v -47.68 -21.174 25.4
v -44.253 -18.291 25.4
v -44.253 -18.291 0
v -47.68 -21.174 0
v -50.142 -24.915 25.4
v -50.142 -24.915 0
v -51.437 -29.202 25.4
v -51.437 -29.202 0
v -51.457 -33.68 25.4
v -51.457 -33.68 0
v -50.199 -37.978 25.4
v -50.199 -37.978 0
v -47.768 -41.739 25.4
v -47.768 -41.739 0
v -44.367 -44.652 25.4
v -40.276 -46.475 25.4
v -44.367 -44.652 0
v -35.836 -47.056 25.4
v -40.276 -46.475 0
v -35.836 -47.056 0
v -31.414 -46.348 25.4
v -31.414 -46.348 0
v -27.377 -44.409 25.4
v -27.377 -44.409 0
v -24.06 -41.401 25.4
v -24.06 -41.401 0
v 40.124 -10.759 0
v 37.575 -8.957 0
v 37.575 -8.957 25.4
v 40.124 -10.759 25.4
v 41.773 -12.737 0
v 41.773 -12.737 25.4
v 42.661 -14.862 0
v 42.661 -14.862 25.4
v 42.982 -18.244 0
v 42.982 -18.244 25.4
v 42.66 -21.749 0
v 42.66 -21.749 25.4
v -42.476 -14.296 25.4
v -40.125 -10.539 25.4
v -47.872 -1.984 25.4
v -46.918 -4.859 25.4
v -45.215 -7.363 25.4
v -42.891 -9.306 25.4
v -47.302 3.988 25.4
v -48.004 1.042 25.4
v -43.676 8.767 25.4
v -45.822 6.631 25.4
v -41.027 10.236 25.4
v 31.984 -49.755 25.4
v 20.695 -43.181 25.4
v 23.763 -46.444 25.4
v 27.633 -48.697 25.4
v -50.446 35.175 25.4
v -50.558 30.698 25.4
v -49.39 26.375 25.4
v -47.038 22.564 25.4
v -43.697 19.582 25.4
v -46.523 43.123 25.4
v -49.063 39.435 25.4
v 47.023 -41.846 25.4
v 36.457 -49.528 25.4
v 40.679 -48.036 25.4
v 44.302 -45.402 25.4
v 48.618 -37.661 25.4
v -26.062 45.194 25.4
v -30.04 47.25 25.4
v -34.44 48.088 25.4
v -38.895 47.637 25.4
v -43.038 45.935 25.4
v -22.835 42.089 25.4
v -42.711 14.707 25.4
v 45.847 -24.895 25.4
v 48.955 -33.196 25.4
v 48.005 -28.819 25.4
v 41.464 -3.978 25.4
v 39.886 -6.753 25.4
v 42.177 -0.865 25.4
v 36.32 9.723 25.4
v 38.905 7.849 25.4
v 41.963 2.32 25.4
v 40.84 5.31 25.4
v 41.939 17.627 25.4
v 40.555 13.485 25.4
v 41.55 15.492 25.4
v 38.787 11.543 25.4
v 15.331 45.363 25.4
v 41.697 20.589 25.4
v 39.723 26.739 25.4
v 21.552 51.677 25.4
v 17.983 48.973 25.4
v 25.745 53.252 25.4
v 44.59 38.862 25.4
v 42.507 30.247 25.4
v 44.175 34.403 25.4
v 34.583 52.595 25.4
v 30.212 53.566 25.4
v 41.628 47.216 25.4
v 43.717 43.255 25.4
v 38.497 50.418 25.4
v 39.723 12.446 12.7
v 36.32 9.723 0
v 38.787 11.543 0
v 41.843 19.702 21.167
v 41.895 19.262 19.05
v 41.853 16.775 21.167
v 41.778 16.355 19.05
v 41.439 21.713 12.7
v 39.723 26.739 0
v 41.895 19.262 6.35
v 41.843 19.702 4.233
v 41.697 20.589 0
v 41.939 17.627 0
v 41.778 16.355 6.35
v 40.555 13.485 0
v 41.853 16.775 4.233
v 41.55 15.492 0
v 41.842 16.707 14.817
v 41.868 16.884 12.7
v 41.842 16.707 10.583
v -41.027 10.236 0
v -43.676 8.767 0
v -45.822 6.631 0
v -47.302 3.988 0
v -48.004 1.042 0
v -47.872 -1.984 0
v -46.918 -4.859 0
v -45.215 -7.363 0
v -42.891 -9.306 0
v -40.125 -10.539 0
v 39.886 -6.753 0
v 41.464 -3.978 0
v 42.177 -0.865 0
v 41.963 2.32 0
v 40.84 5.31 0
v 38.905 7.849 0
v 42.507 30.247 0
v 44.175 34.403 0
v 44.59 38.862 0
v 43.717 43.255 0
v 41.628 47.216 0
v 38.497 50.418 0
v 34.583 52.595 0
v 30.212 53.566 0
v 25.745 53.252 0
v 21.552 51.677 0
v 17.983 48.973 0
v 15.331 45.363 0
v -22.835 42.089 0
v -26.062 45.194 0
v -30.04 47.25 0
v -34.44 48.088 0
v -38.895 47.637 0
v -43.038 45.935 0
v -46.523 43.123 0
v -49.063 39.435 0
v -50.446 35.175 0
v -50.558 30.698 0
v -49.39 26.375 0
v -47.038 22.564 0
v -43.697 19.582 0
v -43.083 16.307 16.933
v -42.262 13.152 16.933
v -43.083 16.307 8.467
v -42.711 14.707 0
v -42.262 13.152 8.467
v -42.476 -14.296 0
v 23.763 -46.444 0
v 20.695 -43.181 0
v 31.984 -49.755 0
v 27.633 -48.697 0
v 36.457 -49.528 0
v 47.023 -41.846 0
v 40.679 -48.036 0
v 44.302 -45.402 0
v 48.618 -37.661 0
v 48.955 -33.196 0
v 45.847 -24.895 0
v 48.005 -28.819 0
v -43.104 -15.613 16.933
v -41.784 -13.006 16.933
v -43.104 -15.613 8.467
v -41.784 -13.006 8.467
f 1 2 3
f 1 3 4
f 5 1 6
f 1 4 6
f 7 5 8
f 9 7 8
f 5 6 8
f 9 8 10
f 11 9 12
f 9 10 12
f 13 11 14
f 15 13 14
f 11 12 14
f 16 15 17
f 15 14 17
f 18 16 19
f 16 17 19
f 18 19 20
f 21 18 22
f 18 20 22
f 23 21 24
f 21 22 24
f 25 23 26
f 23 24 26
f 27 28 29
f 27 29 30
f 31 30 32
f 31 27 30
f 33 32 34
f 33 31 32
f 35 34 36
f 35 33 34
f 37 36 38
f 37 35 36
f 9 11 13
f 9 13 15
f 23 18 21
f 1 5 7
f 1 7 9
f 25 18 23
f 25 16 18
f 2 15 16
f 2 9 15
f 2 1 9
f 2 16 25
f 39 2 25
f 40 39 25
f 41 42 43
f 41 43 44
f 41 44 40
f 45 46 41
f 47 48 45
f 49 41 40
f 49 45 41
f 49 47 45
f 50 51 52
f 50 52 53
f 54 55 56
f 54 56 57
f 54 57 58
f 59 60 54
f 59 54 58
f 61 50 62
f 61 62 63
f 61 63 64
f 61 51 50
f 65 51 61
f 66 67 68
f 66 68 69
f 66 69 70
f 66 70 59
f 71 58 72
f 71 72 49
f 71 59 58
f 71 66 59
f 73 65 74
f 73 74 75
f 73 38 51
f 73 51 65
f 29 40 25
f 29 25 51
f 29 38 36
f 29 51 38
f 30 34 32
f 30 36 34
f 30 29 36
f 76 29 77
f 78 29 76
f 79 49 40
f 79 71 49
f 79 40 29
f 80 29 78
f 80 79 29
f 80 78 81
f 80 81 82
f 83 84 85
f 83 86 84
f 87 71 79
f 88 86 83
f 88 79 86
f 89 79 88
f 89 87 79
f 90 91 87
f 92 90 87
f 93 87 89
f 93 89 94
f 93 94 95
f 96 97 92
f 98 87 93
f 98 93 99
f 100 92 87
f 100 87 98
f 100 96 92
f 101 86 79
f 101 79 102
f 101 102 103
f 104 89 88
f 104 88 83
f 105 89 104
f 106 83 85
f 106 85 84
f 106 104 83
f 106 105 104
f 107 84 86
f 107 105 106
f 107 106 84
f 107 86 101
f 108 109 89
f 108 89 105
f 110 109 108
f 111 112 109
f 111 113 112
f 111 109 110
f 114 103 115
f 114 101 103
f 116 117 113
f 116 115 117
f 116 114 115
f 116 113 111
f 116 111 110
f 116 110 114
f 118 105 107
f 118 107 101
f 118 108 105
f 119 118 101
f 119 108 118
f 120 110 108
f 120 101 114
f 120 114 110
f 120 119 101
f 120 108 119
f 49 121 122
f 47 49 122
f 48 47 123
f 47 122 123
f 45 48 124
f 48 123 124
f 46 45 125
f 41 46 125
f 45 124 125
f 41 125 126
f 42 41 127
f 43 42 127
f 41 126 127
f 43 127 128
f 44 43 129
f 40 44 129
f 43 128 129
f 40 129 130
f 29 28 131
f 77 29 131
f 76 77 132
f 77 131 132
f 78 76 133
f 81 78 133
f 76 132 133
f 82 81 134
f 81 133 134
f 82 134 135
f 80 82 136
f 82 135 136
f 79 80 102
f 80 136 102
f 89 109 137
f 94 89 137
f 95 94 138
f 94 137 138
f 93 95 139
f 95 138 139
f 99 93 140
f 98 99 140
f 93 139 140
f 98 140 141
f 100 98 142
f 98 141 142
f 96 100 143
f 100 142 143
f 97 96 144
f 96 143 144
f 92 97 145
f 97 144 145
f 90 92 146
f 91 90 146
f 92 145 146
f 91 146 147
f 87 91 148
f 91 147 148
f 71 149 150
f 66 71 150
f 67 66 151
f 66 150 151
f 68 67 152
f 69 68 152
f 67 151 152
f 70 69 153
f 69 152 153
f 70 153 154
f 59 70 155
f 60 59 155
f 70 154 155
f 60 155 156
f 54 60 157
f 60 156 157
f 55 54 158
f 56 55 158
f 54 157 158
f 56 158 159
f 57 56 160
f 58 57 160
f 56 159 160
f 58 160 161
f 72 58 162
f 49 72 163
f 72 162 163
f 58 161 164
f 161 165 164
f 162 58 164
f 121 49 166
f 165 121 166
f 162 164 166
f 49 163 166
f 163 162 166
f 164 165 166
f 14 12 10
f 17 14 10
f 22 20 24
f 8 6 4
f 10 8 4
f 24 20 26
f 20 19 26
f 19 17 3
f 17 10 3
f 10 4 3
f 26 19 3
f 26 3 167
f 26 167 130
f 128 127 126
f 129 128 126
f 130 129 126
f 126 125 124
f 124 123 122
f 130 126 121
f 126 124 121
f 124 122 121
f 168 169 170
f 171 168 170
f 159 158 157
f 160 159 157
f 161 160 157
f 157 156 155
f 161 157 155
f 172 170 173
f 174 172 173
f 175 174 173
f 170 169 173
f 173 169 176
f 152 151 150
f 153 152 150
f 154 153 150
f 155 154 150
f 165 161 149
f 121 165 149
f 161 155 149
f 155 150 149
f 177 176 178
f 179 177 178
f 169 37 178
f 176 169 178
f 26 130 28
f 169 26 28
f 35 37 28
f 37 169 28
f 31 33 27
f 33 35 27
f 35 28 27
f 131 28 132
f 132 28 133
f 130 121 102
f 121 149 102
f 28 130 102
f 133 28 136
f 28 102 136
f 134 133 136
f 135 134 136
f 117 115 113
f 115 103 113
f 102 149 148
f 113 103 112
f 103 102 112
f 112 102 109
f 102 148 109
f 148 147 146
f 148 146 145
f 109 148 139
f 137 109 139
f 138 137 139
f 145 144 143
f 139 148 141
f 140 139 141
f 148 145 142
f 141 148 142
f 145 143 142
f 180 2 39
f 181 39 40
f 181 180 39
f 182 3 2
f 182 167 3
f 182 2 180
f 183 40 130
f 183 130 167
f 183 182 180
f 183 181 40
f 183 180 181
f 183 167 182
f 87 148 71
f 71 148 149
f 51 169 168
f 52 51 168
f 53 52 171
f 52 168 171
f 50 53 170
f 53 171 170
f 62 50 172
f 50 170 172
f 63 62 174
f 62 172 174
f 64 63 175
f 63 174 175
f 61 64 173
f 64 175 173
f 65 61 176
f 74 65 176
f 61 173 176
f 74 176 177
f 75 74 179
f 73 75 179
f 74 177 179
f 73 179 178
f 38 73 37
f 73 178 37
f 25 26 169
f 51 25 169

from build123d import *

# Parameters (mm, degrees)
F1_DEPTH = 25.4


with BuildPart() as f1:
    # F0 (on Top) → F1 (new body)
    with BuildSketch(Plane.XY):
        with BuildLine():
            Line((15.3314765699, 45.3634702184), (-22.8350594245, 42.0886999699))
            ThreePointArc((-22.8350594245, 42.0886999699), (-46.5230995583, 43.1231755121), (-43.6973915181, 19.5815366758))
            add(Edge.make_bspline(
                [(-43.6973915181, 19.5815366758), (-43.1174367744, 16.2871292149), (-42.5374820306, 12.9927217539), (-41.0270827556, 10.2359403638)],
                knots=[0, 0, 0, 0, 0.3327137819, 0.3327137819, 0.3327137819, 0.3327137819], degree=3))
            add(Edge.make_bspline(
                [(-41.0270827556, 10.2359403638), (-40.5110375862, 9.2940545041), (-36.8442315299, 4.1334897017), (-28.1561256987, 1.87431405), (-20.9480811119, 0)],
                knots=[0.3327137819, 0.3327137819, 0.3327137819, 0.3327137819, 0.4463892469, 1, 1, 1, 1], degree=3))
            add(Edge.make_bspline(
                [(-40.1252666441, -10.5391209432), (-39.599730448, -9.8778116964), (-35.498491994, -5.4136644053), (-27.6646682205, -2.4989911865), (-20.9480811119, 0)],
                knots=[0.3384673734, 0.3384673734, 0.3384673734, 0.3384673734, 0.4328131906, 1, 1, 1, 1], degree=3))
            add(Edge.make_bspline(
                [(-44.2531548049, -18.2908964757), (-43.1318961623, -15.6012383193), (-42.0106375198, -12.911580163), (-40.1252666441, -10.5391209432)],
                knots=[0, 0, 0, 0, 0.3384673734, 0.3384673734, 0.3384673734, 0.3384673734], degree=3))
            ThreePointArc((-44.2531548049, -18.2908964757), (-47.768426214, -41.7394838947), (-24.0602315313, -41.4005297397))
            Line((-24.0602315313, -41.4005297397), (20.6953128024, -43.1810448239))
            ThreePointArc((20.6953128024, -43.1810448239), (44.3016536318, -45.4023187101), (42.6602594814, -21.7485830585))
            add(Edge.make_bspline(
                [(37.5745547292, -8.9566238299), (38.377714123, -9.423502034), (43.7248416865, -12.9867792586), (43.1537035595, -17.6874028342), (42.6602594814, -21.7485830585)],
                knots=[0.7611513259, 0.7611513259, 0.7611513259, 0.7611513259, 0.7936428016, 1, 1, 1, 1], degree=3))
            add(Edge.make_bspline(
                [(36.319540598, 9.7232166209), (30.2639633531, 5.8212058143), (11.0469761522, -0.50266664), (31.4704630142, -5.408302787), (37.5745547292, -8.9566238299)],
                knots=[0.2799466745, 0.2799466745, 0.2799466745, 0.2799466745, 0.5142128614, 0.7611513259, 0.7611513259, 0.7611513259, 0.7611513259], degree=3))
            add(Edge.make_bspline(
                [(39.7229749773, 26.7391821683), (41.6536861472, 21.6807257291), (44.0243403968, 15.4696199766), (37.6624586898, 10.5885479831), (36.319540598, 9.7232166209)],
                knots=[0, 0, 0, 0, 0.2279945174, 0.2799466745, 0.2799466745, 0.2799466745, 0.2799466745], degree=3))
            ThreePointArc((39.7229749773, 26.7391821683), (38.4970596178, 50.4180866311), (15.3314765699, 45.3634702184))
        make_face()
        with BuildLine():
            add(Edge.make_bspline(
                [(-41.0270827556, 10.2359403638), (-40.5110375862, 9.2940545041), (-36.8442315299, 4.1334897017), (-28.1561256987, 1.87431405), (-20.9480811119, 0)],
                knots=[0.3327137819, 0.3327137819, 0.3327137819, 0.3327137819, 0.4463892469, 1, 1, 1, 1], degree=3))
            ThreePointArc((-41.0270827556, 10.2359403638), (-48.0428369726, -0.4757075685), (-40.1252666441, -10.5391209432))
            add(Edge.make_bspline(
                [(-40.1252666441, -10.5391209432), (-39.599730448, -9.8778116964), (-35.498491994, -5.4136644053), (-27.6646682205, -2.4989911865), (-20.9480811119, 0)],
                knots=[0.3384673734, 0.3384673734, 0.3384673734, 0.3384673734, 0.4328131906, 1, 1, 1, 1], degree=3))
        make_face()
        with BuildLine():
            ThreePointArc((37.5745547292, -8.9566238299), (42.1864816242, 0.7353103047), (36.319540598, 9.7232166209))
            add(Edge.make_bspline(
                [(36.319540598, 9.7232166209), (30.2639633531, 5.8212058143), (11.0469761522, -0.50266664), (31.4704630142, -5.408302787), (37.5745547292, -8.9566238299)],
                knots=[0.2799466745, 0.2799466745, 0.2799466745, 0.2799466745, 0.5142128614, 0.7611513259, 0.7611513259, 0.7611513259, 0.7611513259], degree=3))
        make_face()
    extrude(amount=F1_DEPTH)


solid = f1.part
